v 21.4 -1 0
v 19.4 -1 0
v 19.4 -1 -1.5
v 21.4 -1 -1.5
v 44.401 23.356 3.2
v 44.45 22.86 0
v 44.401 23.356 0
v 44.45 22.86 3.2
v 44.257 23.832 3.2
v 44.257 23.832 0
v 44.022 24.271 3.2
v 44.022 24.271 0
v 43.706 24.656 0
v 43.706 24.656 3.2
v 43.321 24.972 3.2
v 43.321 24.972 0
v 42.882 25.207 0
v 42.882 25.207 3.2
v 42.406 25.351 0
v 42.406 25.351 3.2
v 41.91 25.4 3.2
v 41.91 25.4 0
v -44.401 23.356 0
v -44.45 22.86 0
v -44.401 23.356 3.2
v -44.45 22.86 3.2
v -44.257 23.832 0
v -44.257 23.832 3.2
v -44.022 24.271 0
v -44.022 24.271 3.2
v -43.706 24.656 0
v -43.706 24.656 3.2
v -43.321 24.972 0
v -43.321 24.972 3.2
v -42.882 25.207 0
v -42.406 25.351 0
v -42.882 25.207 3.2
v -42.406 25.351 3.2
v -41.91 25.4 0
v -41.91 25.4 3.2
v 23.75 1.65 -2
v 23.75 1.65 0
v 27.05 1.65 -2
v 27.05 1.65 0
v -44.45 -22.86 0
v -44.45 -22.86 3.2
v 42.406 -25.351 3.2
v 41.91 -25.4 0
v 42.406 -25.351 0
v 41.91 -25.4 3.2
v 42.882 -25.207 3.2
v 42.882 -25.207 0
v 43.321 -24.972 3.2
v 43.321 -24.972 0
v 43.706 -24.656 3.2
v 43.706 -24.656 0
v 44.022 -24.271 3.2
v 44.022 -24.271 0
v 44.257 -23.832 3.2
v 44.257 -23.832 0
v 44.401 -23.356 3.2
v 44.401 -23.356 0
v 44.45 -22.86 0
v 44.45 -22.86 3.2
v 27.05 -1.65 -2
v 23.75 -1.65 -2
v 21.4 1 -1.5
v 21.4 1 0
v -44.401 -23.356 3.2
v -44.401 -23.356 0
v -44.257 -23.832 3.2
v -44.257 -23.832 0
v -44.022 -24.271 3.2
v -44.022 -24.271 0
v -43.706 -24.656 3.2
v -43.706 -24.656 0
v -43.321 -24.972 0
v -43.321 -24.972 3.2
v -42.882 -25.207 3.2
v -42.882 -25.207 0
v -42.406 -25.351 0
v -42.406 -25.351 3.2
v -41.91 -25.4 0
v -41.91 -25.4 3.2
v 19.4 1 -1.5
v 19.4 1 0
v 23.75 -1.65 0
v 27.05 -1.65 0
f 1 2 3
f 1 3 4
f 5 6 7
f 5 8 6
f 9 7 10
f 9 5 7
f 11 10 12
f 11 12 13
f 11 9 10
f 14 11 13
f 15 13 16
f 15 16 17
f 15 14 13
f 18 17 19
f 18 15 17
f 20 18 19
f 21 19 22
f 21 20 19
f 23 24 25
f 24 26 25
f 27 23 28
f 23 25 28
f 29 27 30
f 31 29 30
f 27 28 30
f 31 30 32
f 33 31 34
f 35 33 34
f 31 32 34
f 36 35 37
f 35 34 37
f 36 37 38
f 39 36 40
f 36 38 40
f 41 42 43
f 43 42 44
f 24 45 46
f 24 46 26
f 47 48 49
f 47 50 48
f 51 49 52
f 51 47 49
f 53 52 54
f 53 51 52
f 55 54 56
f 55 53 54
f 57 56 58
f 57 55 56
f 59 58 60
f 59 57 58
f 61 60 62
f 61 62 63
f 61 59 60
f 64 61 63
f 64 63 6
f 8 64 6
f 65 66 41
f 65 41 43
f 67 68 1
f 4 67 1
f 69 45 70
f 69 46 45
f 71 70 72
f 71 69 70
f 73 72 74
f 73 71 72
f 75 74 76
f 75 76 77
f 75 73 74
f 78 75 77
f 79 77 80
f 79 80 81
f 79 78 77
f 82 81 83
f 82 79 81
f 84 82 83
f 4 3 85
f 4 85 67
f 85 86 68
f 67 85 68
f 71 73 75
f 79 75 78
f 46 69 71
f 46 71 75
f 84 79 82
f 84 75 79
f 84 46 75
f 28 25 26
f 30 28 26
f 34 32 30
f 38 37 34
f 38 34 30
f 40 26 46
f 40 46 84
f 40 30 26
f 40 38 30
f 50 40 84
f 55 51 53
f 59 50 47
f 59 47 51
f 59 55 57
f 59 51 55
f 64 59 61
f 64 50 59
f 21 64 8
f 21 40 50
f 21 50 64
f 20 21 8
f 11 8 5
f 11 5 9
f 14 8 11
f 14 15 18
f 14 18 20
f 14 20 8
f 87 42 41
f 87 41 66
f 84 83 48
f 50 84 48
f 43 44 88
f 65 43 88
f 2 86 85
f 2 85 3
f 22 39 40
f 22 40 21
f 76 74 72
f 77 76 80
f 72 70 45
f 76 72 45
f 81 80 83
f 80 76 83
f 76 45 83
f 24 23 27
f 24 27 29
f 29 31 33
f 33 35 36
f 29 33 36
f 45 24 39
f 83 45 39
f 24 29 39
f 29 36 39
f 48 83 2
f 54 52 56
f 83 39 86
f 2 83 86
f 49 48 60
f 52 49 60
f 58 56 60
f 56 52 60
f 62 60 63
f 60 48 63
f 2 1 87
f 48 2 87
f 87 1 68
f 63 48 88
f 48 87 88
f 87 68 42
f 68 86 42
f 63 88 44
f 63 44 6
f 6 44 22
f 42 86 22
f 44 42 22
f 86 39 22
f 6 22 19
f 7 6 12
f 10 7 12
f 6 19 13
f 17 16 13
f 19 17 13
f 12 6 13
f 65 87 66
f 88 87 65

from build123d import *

# Parameters (mm, degrees)
F0_W     = 88.9
F0_H     = 50.8
F1_DEPTH = 3.2
F2_R     = 2.54
F4_W     = 3.3
F4_H     = 3.3
F5_DEPTH = 2
F7_W     = 2
F7_H     = 2
F8_DEPTH = 1.5


with BuildPart() as f1:
    # F0 (on Top) → F1 (new body)
    with BuildSketch(Plane.XY):
        Rectangle(F0_W, F0_H)
    extrude(amount=F1_DEPTH)

    # F2
    f2_edges = [f1.edges().sort_by_distance(p)[0] for p in [
        (44.45, -25.4, 1.6),
        (44.45, 25.4, 1.6),
        (-44.45, -25.4, 1.6),
        (-44.45, 25.4, 1.6),
    ]]
    fillet(f2_edges, radius=F2_R)

    # F4 (on face) → F5 (join)
    with BuildSketch(Plane(origin=(0, 0, 0), x_dir=(1, 0, 0), z_dir=(0, 0, -1))):
        with Locations((25.4, 0)):
            Rectangle(F4_W, F4_H)
    extrude(amount=F5_DEPTH)

    # F7 (on face) → F8 (join)
    with BuildSketch(Plane(origin=(0, 0, 0), x_dir=(1, 0, 0), z_dir=(0, 0, -1))):
        with Locations((20.4, 0)):
            Rectangle(F7_W, F7_H)
    extrude(amount=F8_DEPTH)


solid = f1.part
